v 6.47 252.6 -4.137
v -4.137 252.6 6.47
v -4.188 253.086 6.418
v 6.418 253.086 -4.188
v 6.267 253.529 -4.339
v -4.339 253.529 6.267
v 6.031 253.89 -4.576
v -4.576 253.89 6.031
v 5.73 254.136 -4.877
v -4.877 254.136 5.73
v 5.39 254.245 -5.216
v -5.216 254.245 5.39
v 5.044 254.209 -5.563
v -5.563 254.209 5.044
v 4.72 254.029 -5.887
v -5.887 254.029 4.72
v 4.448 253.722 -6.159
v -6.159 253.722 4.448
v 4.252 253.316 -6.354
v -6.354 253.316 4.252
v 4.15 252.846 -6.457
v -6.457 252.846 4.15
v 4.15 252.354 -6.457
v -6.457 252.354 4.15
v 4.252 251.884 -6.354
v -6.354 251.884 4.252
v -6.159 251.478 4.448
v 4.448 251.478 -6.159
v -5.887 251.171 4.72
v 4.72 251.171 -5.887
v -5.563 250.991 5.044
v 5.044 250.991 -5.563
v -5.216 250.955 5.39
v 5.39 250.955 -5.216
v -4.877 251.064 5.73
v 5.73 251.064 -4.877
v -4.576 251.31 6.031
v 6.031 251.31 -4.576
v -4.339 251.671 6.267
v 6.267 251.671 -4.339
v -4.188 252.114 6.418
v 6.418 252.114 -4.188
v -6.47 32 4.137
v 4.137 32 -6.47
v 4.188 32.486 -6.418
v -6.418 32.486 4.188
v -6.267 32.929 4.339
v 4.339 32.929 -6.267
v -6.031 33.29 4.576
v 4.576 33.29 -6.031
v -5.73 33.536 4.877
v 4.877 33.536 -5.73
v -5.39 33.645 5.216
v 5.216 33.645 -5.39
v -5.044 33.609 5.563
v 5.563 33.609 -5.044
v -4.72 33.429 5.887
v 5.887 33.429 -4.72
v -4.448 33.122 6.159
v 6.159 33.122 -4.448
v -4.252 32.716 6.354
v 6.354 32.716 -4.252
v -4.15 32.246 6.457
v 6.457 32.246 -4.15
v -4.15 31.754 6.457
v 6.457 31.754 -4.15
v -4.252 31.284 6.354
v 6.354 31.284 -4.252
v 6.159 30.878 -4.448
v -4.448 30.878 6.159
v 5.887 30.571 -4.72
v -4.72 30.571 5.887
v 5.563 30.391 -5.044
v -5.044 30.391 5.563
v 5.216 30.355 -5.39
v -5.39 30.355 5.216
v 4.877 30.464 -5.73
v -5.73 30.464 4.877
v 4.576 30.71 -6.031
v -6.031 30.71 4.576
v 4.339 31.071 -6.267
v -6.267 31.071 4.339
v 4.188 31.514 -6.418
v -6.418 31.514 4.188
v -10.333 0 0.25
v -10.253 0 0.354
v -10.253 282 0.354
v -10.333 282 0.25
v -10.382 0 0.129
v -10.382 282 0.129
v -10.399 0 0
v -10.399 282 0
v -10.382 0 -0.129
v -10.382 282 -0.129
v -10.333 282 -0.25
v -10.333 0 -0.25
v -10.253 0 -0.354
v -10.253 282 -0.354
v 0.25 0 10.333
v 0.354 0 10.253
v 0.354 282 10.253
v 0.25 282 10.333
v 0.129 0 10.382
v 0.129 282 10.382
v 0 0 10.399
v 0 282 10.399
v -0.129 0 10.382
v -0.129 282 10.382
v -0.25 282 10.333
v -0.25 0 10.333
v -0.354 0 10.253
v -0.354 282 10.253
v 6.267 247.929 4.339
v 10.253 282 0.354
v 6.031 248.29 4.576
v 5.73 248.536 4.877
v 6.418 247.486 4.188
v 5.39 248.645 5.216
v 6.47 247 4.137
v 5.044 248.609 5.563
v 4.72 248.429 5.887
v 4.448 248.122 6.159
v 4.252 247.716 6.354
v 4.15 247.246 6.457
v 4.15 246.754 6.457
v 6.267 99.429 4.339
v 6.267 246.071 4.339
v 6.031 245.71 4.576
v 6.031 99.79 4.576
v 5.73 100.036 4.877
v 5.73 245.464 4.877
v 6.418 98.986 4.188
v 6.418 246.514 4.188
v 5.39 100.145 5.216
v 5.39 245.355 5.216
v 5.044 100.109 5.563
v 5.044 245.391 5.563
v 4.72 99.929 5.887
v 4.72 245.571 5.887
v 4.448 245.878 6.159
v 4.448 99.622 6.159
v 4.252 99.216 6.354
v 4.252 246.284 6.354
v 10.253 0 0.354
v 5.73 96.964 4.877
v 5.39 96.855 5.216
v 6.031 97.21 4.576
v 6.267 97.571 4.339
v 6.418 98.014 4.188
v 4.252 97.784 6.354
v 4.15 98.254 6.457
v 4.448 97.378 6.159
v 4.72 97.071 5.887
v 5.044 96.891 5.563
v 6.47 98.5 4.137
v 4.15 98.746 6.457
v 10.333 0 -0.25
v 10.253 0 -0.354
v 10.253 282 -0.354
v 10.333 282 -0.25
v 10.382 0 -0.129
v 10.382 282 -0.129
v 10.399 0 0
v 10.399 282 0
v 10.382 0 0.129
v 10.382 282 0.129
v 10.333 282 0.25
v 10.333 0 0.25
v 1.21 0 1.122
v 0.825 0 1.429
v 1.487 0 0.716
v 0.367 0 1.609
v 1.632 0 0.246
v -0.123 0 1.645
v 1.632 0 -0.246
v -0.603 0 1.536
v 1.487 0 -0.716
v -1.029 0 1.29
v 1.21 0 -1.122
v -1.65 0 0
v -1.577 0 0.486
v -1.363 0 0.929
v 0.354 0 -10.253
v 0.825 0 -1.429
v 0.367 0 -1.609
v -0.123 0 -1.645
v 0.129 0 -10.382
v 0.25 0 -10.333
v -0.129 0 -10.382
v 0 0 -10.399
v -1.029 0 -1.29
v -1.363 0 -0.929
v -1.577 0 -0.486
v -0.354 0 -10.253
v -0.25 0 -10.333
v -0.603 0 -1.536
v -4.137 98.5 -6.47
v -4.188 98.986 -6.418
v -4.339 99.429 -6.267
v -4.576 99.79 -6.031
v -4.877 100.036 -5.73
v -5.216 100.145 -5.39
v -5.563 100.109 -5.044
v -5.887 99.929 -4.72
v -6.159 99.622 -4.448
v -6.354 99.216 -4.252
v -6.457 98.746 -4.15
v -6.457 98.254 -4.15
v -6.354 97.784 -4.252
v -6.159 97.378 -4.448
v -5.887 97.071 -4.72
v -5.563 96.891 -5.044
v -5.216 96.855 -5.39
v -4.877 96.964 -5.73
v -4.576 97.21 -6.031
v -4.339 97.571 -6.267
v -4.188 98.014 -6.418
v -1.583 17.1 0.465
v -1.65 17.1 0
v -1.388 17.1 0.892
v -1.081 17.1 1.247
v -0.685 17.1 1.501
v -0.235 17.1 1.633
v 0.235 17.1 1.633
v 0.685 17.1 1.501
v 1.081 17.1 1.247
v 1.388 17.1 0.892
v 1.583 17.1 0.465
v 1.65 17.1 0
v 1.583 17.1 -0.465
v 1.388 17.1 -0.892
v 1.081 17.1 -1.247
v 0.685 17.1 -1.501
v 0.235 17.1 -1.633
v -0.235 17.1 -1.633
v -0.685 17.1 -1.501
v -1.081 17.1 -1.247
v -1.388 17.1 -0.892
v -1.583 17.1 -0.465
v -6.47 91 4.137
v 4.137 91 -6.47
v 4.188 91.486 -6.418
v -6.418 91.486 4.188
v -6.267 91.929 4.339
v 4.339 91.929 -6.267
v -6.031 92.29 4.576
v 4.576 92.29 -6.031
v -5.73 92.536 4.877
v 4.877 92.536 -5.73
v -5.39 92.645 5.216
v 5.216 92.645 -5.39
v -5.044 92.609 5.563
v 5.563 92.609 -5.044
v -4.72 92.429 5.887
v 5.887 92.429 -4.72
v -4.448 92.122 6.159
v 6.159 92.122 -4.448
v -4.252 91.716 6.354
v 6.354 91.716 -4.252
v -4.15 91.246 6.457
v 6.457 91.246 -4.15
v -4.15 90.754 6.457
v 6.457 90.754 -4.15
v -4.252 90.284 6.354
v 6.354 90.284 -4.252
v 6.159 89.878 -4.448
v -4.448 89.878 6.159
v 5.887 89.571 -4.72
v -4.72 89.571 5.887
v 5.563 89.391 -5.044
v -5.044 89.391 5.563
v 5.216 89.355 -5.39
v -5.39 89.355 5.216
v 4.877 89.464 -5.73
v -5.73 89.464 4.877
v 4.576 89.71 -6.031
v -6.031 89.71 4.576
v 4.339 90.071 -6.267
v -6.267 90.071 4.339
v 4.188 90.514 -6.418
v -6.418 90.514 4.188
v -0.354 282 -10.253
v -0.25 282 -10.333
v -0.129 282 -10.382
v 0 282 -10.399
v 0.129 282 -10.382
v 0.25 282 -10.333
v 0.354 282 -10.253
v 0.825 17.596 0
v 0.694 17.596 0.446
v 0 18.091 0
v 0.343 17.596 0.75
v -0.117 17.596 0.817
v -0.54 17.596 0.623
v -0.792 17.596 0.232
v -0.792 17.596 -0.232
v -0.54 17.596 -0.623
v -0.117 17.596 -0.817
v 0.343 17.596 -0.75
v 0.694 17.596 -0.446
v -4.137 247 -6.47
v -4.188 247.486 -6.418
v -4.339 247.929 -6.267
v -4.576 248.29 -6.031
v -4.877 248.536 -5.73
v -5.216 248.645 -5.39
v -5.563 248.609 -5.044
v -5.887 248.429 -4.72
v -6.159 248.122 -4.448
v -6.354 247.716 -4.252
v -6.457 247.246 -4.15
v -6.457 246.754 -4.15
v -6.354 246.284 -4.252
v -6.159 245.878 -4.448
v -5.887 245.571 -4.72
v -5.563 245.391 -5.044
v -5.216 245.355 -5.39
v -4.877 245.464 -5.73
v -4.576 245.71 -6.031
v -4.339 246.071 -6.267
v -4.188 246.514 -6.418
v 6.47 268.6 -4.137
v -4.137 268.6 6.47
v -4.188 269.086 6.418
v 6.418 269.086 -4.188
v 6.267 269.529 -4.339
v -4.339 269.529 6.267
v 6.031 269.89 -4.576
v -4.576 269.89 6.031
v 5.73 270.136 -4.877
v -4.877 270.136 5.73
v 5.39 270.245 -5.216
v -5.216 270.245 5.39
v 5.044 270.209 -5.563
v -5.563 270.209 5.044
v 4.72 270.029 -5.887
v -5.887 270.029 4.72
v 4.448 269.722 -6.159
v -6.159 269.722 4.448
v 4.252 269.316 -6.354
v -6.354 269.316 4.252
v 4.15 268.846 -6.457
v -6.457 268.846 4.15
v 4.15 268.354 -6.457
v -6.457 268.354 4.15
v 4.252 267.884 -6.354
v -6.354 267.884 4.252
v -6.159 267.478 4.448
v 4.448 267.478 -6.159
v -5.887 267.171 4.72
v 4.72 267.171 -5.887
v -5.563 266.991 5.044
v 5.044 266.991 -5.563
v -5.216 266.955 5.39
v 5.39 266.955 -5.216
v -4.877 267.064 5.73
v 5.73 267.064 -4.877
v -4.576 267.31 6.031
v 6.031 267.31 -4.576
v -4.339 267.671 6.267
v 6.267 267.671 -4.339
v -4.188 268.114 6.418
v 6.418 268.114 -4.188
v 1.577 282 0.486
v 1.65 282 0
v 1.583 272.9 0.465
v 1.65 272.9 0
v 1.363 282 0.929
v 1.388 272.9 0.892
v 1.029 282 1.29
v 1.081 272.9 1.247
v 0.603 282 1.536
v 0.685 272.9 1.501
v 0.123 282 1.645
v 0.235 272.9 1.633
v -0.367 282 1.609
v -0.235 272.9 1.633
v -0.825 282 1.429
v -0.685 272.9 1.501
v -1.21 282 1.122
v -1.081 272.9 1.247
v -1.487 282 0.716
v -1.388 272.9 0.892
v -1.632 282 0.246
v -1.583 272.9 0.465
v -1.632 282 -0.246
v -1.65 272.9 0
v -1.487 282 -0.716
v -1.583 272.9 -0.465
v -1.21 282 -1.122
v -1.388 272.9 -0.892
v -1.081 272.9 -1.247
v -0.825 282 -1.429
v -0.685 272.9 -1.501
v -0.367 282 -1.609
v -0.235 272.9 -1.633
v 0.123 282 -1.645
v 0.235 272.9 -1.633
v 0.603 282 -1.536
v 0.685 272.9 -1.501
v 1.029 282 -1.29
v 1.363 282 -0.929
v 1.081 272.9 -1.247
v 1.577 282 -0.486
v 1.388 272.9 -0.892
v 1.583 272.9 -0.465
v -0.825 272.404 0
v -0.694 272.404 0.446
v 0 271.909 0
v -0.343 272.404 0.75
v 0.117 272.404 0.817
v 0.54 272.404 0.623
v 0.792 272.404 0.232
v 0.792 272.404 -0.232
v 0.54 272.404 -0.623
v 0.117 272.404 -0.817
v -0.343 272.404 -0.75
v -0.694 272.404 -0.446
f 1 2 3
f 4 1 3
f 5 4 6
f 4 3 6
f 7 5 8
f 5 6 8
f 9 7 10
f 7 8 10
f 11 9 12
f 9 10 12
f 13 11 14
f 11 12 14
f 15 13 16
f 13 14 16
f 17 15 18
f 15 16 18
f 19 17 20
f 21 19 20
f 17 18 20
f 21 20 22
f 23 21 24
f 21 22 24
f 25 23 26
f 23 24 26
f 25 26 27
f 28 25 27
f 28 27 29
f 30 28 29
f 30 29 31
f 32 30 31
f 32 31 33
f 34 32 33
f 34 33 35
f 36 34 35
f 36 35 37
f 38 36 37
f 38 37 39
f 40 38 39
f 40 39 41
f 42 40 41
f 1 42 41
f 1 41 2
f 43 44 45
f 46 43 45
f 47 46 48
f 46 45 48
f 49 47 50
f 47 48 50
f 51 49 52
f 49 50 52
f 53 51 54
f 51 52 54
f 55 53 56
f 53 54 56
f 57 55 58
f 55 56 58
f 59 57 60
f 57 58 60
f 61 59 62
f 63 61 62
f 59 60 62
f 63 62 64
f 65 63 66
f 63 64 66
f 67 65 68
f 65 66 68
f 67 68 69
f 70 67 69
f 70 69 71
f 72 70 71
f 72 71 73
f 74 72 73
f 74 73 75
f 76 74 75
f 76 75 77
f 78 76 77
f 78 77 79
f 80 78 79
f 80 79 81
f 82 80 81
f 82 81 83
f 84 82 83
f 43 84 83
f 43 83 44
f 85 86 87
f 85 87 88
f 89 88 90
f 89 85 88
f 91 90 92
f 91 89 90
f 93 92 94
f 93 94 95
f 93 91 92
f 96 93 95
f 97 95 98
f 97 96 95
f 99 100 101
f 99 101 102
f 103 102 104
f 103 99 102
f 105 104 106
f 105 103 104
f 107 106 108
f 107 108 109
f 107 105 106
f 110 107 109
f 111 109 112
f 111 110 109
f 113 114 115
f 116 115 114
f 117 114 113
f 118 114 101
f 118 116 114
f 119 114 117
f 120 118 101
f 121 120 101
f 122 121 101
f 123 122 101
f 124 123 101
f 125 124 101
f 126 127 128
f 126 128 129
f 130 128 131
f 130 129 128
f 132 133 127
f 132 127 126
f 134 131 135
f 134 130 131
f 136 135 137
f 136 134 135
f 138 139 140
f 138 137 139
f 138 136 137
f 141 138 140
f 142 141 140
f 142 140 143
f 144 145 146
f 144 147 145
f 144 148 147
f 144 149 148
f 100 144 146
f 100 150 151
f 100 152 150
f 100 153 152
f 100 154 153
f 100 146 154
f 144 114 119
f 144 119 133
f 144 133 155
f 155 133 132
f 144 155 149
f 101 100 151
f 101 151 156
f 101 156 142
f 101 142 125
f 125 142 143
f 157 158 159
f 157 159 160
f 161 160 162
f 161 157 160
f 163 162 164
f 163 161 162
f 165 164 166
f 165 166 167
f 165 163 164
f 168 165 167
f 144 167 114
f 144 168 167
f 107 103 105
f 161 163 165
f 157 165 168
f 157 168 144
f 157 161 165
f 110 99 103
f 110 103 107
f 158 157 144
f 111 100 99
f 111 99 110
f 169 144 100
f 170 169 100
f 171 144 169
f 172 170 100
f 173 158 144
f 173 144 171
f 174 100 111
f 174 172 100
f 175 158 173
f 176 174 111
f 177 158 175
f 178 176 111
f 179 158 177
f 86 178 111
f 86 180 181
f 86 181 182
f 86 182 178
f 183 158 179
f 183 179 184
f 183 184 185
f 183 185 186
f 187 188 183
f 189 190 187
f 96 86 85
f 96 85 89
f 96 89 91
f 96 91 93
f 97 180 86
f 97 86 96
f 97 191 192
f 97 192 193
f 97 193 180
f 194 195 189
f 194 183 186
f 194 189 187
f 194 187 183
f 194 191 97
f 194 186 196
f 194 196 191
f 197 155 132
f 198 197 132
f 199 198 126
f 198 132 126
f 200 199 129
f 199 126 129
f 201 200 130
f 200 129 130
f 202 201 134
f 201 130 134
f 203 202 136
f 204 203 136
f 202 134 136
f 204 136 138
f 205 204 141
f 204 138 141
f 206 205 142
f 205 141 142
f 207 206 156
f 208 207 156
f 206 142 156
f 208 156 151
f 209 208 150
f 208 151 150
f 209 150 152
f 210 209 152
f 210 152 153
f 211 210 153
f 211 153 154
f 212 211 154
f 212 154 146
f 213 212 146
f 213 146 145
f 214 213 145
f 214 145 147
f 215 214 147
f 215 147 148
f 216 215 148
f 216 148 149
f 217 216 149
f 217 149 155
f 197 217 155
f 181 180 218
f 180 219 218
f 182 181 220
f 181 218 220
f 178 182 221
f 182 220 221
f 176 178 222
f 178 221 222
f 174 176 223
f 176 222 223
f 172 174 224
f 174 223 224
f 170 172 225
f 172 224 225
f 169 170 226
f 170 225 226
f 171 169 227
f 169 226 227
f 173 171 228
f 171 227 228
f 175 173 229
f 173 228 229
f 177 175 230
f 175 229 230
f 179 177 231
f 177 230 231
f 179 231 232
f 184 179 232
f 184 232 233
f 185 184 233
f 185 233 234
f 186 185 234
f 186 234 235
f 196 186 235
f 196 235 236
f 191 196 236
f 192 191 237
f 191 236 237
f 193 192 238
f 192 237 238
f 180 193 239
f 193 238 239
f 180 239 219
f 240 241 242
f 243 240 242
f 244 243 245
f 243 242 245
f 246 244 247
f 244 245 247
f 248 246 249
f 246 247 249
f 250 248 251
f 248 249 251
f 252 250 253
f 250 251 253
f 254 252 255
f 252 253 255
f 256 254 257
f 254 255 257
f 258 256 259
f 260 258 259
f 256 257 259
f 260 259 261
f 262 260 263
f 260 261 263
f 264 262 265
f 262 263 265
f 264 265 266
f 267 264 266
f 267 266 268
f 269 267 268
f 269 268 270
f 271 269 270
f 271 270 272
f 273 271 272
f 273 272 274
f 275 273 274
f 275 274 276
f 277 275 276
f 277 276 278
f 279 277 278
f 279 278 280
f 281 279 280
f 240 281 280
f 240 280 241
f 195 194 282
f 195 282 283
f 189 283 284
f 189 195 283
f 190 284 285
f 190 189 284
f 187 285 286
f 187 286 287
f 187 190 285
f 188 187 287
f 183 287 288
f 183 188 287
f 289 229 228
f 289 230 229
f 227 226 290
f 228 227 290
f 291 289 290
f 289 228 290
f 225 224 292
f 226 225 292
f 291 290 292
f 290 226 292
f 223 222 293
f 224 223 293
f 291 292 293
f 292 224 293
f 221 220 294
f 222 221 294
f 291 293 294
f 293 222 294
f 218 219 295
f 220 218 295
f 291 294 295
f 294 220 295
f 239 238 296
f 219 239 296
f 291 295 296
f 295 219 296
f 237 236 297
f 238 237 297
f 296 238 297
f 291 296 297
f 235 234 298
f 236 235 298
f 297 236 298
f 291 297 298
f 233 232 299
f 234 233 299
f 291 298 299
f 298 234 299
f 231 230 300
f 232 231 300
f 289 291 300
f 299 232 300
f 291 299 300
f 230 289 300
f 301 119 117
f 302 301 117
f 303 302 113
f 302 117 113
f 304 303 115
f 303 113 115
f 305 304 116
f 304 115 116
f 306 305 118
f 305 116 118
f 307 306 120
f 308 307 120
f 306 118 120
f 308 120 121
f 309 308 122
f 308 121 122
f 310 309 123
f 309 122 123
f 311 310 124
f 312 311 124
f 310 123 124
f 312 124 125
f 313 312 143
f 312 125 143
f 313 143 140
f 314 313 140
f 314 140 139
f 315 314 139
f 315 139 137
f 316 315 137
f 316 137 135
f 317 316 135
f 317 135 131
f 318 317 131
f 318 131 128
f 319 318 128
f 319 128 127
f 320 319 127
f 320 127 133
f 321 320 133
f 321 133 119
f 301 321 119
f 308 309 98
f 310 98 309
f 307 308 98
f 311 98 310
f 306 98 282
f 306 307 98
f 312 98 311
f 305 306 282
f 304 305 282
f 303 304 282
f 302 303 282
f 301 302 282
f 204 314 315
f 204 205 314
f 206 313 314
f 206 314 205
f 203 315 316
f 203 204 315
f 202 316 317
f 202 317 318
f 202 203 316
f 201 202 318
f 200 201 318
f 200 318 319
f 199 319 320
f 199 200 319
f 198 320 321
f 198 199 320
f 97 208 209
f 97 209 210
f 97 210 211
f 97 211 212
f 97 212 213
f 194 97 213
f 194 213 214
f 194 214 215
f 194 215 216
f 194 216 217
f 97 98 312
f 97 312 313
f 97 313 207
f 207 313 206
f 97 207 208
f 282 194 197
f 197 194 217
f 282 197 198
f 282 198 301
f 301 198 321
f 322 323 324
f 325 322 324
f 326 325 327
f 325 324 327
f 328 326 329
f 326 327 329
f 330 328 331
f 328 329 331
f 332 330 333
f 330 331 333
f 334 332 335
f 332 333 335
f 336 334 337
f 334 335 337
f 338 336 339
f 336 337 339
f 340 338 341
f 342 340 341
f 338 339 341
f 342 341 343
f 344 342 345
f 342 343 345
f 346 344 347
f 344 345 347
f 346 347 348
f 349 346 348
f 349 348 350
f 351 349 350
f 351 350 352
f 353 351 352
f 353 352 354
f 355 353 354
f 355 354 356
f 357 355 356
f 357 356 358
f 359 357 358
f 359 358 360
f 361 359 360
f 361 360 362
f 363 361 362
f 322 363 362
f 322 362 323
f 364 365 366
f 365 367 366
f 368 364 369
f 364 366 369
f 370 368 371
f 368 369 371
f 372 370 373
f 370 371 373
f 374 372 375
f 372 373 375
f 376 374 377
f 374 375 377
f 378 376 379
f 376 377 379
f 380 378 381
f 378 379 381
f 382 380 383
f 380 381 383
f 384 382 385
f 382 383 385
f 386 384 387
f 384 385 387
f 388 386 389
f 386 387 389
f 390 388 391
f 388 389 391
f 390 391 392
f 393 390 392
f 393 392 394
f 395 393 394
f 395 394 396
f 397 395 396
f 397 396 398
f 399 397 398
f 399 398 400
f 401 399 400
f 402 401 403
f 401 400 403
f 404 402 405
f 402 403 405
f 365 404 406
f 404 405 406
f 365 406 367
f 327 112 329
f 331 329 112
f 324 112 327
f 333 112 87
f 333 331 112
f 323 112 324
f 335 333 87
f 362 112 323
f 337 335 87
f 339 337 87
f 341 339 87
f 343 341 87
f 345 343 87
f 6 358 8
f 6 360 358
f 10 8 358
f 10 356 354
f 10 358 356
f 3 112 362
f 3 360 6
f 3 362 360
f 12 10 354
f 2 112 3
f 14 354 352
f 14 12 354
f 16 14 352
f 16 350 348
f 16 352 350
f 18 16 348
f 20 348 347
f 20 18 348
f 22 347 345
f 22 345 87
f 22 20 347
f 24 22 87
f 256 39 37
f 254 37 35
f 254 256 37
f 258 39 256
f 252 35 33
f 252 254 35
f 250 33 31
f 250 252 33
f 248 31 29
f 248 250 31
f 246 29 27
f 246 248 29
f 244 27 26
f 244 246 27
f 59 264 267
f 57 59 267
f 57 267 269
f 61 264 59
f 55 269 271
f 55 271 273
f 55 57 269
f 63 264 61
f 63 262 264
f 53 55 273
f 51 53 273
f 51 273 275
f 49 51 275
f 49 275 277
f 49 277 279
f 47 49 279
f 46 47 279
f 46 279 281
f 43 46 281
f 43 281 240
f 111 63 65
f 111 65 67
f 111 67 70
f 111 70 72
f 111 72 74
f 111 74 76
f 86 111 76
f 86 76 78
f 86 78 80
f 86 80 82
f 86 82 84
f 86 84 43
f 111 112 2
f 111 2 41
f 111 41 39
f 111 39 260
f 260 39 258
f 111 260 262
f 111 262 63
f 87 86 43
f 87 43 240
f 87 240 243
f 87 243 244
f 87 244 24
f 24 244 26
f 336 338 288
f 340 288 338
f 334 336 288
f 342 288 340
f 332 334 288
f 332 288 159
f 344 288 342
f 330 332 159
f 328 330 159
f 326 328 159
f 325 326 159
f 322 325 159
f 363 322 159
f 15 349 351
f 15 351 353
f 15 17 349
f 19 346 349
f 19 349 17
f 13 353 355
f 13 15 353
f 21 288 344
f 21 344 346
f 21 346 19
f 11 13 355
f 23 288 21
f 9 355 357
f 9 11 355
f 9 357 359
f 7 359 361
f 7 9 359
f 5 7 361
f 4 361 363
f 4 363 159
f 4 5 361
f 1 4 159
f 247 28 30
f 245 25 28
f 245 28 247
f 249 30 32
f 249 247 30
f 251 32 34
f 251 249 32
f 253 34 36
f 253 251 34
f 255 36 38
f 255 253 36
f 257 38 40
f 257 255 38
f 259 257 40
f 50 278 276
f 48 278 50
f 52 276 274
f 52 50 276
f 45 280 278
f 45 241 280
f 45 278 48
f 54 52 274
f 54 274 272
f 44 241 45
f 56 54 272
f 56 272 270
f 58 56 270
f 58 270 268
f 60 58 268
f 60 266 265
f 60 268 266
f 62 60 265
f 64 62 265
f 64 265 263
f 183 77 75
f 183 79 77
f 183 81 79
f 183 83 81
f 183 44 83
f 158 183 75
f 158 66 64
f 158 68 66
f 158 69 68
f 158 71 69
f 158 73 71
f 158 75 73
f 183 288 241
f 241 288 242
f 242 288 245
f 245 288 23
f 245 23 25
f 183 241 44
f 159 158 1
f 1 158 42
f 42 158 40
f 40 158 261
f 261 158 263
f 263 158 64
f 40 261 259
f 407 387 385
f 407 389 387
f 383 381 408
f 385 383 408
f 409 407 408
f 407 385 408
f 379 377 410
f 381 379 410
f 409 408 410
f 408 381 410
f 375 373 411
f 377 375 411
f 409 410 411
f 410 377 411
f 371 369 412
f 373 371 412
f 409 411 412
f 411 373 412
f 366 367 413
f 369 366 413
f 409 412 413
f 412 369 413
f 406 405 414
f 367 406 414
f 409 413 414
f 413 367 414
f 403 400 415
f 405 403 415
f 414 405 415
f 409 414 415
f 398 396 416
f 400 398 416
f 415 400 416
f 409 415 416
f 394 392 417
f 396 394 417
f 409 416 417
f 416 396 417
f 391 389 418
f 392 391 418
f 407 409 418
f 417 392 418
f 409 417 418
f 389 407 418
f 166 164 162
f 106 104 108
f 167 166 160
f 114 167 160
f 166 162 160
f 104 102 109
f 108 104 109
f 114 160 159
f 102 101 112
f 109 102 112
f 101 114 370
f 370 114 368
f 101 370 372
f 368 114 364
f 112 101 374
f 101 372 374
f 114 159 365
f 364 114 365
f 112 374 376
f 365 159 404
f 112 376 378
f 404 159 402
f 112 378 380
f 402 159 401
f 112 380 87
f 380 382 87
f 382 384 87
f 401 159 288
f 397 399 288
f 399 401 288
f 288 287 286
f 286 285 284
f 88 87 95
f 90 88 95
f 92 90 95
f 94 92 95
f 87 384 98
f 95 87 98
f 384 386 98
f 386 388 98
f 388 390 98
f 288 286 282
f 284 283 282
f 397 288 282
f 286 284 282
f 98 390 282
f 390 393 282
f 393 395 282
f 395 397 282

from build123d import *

# Parameters (mm, degrees)
EXTRUSION1_DEPTH          = 282
TROU_TARAUD_M4X0_72_D     = 3.3
TROU_TARAUD_M4X0_72_DEPTH = 17.1
TROU_TARAUD_M4X0_72_TIP   = 0.991420021
TROU_TARAUD_M4X0_73_D     = 3.3
TROU_TARAUD_M4X0_73_DEPTH = 9.1
TROU_TARAUD_M4X0_73_TIP   = 0.991420021
TROU_TARAUD_M4X0_74_D     = 3.3
TROU_TARAUD_M4X0_75_D     = 3.3
TROU_TARAUD_M4X0_76_D     = 3.3


with BuildPart() as part:
    # Esquisse1 → Extrusion1 (new body)
    with BuildSketch(Plane(origin=(0, 0, 0), x_dir=(1, 0, 0), z_dir=(0, 1, 0))):
        with BuildLine():
            Line((0.353553391, 10.253048327), (10.253048327, 0.353553391))
            ThreePointArc((10.253048327, 0.353553391), (10.399494937, 0), (10.253048327, -0.353553391))
            Line((10.253048327, -0.353553391), (0.353553391, -10.253048327))
            ThreePointArc((0.353553391, -10.253048327), (0, -10.399494937), (-0.353553391, -10.253048327))
            Line((-0.353553391, -10.253048327), (-10.253048327, -0.353553391))
            ThreePointArc((-10.253048327, -0.353553391), (-10.399494937, 0), (-10.253048327, 0.353553391))
            Line((-10.253048327, 0.353553391), (-0.353553391, 10.253048327))
            ThreePointArc((-0.353553391, 10.253048327), (0, 10.399494937), (0.353553391, 10.253048327))
        make_face()
    extrude(amount=EXTRUSION1_DEPTH)

    # Trou taraudé M4x0.72
    with Locations(Plane.XZ):
        with Locations((0, 0)):
            Hole(TROU_TARAUD_M4X0_72_D / 2, depth=TROU_TARAUD_M4X0_72_DEPTH)
            with Locations((0, 0, -(TROU_TARAUD_M4X0_72_DEPTH + TROU_TARAUD_M4X0_72_TIP / 2))):  # 118° drill point
                Cone(0, TROU_TARAUD_M4X0_72_D / 2, TROU_TARAUD_M4X0_72_TIP, mode=Mode.SUBTRACT)

    # Trou taraudé M4x0.73
    with Locations(Plane(origin=(0, 282, 0), x_dir=(-1, 0, 0), z_dir=(0, 1, 0))):
        with Locations((0, 0)):
            Hole(TROU_TARAUD_M4X0_73_D / 2, depth=TROU_TARAUD_M4X0_73_DEPTH)
            with Locations((0, 0, -(TROU_TARAUD_M4X0_73_DEPTH + TROU_TARAUD_M4X0_73_TIP / 2))):  # 118° drill point
                Cone(0, TROU_TARAUD_M4X0_73_D / 2, TROU_TARAUD_M4X0_73_TIP, mode=Mode.SUBTRACT)

    # Trou taraudé M4x0.74 (through all)
    with Locations(Plane(origin=(-5.303300859, 0, 5.303300859), x_dir=(0.7071067811865477, 0, 0.7071067811865474), z_dir=(-0.7071067811865474, 0, 0.7071067811865477))):
        with Locations((0, 91), (0, 32)):
            Hole(TROU_TARAUD_M4X0_74_D / 2)

    # Trou taraudé M4x0.75 (through all)
    with Locations(Plane(origin=(-5.303300859, 0, -5.303300859), x_dir=(-0.7071067811865477, 0, 0.7071067811865475), z_dir=(-0.7071067811865475, 0, -0.7071067811865477))):
        with Locations((0, 98.5), (0, 247)):
            Hole(TROU_TARAUD_M4X0_75_D / 2)

    # Trou taraudé M4x0.76 (through all)
    with Locations(Plane(origin=(5.303300859, 0, -5.303300859), x_dir=(-0.7071067811865474, 0, -0.7071067811865477), z_dir=(0.7071067811865477, 0, -0.7071067811865474))):
        with Locations((0, 268.6), (0, 252.6)):
            Hole(TROU_TARAUD_M4X0_76_D / 2)


solid = part.part
